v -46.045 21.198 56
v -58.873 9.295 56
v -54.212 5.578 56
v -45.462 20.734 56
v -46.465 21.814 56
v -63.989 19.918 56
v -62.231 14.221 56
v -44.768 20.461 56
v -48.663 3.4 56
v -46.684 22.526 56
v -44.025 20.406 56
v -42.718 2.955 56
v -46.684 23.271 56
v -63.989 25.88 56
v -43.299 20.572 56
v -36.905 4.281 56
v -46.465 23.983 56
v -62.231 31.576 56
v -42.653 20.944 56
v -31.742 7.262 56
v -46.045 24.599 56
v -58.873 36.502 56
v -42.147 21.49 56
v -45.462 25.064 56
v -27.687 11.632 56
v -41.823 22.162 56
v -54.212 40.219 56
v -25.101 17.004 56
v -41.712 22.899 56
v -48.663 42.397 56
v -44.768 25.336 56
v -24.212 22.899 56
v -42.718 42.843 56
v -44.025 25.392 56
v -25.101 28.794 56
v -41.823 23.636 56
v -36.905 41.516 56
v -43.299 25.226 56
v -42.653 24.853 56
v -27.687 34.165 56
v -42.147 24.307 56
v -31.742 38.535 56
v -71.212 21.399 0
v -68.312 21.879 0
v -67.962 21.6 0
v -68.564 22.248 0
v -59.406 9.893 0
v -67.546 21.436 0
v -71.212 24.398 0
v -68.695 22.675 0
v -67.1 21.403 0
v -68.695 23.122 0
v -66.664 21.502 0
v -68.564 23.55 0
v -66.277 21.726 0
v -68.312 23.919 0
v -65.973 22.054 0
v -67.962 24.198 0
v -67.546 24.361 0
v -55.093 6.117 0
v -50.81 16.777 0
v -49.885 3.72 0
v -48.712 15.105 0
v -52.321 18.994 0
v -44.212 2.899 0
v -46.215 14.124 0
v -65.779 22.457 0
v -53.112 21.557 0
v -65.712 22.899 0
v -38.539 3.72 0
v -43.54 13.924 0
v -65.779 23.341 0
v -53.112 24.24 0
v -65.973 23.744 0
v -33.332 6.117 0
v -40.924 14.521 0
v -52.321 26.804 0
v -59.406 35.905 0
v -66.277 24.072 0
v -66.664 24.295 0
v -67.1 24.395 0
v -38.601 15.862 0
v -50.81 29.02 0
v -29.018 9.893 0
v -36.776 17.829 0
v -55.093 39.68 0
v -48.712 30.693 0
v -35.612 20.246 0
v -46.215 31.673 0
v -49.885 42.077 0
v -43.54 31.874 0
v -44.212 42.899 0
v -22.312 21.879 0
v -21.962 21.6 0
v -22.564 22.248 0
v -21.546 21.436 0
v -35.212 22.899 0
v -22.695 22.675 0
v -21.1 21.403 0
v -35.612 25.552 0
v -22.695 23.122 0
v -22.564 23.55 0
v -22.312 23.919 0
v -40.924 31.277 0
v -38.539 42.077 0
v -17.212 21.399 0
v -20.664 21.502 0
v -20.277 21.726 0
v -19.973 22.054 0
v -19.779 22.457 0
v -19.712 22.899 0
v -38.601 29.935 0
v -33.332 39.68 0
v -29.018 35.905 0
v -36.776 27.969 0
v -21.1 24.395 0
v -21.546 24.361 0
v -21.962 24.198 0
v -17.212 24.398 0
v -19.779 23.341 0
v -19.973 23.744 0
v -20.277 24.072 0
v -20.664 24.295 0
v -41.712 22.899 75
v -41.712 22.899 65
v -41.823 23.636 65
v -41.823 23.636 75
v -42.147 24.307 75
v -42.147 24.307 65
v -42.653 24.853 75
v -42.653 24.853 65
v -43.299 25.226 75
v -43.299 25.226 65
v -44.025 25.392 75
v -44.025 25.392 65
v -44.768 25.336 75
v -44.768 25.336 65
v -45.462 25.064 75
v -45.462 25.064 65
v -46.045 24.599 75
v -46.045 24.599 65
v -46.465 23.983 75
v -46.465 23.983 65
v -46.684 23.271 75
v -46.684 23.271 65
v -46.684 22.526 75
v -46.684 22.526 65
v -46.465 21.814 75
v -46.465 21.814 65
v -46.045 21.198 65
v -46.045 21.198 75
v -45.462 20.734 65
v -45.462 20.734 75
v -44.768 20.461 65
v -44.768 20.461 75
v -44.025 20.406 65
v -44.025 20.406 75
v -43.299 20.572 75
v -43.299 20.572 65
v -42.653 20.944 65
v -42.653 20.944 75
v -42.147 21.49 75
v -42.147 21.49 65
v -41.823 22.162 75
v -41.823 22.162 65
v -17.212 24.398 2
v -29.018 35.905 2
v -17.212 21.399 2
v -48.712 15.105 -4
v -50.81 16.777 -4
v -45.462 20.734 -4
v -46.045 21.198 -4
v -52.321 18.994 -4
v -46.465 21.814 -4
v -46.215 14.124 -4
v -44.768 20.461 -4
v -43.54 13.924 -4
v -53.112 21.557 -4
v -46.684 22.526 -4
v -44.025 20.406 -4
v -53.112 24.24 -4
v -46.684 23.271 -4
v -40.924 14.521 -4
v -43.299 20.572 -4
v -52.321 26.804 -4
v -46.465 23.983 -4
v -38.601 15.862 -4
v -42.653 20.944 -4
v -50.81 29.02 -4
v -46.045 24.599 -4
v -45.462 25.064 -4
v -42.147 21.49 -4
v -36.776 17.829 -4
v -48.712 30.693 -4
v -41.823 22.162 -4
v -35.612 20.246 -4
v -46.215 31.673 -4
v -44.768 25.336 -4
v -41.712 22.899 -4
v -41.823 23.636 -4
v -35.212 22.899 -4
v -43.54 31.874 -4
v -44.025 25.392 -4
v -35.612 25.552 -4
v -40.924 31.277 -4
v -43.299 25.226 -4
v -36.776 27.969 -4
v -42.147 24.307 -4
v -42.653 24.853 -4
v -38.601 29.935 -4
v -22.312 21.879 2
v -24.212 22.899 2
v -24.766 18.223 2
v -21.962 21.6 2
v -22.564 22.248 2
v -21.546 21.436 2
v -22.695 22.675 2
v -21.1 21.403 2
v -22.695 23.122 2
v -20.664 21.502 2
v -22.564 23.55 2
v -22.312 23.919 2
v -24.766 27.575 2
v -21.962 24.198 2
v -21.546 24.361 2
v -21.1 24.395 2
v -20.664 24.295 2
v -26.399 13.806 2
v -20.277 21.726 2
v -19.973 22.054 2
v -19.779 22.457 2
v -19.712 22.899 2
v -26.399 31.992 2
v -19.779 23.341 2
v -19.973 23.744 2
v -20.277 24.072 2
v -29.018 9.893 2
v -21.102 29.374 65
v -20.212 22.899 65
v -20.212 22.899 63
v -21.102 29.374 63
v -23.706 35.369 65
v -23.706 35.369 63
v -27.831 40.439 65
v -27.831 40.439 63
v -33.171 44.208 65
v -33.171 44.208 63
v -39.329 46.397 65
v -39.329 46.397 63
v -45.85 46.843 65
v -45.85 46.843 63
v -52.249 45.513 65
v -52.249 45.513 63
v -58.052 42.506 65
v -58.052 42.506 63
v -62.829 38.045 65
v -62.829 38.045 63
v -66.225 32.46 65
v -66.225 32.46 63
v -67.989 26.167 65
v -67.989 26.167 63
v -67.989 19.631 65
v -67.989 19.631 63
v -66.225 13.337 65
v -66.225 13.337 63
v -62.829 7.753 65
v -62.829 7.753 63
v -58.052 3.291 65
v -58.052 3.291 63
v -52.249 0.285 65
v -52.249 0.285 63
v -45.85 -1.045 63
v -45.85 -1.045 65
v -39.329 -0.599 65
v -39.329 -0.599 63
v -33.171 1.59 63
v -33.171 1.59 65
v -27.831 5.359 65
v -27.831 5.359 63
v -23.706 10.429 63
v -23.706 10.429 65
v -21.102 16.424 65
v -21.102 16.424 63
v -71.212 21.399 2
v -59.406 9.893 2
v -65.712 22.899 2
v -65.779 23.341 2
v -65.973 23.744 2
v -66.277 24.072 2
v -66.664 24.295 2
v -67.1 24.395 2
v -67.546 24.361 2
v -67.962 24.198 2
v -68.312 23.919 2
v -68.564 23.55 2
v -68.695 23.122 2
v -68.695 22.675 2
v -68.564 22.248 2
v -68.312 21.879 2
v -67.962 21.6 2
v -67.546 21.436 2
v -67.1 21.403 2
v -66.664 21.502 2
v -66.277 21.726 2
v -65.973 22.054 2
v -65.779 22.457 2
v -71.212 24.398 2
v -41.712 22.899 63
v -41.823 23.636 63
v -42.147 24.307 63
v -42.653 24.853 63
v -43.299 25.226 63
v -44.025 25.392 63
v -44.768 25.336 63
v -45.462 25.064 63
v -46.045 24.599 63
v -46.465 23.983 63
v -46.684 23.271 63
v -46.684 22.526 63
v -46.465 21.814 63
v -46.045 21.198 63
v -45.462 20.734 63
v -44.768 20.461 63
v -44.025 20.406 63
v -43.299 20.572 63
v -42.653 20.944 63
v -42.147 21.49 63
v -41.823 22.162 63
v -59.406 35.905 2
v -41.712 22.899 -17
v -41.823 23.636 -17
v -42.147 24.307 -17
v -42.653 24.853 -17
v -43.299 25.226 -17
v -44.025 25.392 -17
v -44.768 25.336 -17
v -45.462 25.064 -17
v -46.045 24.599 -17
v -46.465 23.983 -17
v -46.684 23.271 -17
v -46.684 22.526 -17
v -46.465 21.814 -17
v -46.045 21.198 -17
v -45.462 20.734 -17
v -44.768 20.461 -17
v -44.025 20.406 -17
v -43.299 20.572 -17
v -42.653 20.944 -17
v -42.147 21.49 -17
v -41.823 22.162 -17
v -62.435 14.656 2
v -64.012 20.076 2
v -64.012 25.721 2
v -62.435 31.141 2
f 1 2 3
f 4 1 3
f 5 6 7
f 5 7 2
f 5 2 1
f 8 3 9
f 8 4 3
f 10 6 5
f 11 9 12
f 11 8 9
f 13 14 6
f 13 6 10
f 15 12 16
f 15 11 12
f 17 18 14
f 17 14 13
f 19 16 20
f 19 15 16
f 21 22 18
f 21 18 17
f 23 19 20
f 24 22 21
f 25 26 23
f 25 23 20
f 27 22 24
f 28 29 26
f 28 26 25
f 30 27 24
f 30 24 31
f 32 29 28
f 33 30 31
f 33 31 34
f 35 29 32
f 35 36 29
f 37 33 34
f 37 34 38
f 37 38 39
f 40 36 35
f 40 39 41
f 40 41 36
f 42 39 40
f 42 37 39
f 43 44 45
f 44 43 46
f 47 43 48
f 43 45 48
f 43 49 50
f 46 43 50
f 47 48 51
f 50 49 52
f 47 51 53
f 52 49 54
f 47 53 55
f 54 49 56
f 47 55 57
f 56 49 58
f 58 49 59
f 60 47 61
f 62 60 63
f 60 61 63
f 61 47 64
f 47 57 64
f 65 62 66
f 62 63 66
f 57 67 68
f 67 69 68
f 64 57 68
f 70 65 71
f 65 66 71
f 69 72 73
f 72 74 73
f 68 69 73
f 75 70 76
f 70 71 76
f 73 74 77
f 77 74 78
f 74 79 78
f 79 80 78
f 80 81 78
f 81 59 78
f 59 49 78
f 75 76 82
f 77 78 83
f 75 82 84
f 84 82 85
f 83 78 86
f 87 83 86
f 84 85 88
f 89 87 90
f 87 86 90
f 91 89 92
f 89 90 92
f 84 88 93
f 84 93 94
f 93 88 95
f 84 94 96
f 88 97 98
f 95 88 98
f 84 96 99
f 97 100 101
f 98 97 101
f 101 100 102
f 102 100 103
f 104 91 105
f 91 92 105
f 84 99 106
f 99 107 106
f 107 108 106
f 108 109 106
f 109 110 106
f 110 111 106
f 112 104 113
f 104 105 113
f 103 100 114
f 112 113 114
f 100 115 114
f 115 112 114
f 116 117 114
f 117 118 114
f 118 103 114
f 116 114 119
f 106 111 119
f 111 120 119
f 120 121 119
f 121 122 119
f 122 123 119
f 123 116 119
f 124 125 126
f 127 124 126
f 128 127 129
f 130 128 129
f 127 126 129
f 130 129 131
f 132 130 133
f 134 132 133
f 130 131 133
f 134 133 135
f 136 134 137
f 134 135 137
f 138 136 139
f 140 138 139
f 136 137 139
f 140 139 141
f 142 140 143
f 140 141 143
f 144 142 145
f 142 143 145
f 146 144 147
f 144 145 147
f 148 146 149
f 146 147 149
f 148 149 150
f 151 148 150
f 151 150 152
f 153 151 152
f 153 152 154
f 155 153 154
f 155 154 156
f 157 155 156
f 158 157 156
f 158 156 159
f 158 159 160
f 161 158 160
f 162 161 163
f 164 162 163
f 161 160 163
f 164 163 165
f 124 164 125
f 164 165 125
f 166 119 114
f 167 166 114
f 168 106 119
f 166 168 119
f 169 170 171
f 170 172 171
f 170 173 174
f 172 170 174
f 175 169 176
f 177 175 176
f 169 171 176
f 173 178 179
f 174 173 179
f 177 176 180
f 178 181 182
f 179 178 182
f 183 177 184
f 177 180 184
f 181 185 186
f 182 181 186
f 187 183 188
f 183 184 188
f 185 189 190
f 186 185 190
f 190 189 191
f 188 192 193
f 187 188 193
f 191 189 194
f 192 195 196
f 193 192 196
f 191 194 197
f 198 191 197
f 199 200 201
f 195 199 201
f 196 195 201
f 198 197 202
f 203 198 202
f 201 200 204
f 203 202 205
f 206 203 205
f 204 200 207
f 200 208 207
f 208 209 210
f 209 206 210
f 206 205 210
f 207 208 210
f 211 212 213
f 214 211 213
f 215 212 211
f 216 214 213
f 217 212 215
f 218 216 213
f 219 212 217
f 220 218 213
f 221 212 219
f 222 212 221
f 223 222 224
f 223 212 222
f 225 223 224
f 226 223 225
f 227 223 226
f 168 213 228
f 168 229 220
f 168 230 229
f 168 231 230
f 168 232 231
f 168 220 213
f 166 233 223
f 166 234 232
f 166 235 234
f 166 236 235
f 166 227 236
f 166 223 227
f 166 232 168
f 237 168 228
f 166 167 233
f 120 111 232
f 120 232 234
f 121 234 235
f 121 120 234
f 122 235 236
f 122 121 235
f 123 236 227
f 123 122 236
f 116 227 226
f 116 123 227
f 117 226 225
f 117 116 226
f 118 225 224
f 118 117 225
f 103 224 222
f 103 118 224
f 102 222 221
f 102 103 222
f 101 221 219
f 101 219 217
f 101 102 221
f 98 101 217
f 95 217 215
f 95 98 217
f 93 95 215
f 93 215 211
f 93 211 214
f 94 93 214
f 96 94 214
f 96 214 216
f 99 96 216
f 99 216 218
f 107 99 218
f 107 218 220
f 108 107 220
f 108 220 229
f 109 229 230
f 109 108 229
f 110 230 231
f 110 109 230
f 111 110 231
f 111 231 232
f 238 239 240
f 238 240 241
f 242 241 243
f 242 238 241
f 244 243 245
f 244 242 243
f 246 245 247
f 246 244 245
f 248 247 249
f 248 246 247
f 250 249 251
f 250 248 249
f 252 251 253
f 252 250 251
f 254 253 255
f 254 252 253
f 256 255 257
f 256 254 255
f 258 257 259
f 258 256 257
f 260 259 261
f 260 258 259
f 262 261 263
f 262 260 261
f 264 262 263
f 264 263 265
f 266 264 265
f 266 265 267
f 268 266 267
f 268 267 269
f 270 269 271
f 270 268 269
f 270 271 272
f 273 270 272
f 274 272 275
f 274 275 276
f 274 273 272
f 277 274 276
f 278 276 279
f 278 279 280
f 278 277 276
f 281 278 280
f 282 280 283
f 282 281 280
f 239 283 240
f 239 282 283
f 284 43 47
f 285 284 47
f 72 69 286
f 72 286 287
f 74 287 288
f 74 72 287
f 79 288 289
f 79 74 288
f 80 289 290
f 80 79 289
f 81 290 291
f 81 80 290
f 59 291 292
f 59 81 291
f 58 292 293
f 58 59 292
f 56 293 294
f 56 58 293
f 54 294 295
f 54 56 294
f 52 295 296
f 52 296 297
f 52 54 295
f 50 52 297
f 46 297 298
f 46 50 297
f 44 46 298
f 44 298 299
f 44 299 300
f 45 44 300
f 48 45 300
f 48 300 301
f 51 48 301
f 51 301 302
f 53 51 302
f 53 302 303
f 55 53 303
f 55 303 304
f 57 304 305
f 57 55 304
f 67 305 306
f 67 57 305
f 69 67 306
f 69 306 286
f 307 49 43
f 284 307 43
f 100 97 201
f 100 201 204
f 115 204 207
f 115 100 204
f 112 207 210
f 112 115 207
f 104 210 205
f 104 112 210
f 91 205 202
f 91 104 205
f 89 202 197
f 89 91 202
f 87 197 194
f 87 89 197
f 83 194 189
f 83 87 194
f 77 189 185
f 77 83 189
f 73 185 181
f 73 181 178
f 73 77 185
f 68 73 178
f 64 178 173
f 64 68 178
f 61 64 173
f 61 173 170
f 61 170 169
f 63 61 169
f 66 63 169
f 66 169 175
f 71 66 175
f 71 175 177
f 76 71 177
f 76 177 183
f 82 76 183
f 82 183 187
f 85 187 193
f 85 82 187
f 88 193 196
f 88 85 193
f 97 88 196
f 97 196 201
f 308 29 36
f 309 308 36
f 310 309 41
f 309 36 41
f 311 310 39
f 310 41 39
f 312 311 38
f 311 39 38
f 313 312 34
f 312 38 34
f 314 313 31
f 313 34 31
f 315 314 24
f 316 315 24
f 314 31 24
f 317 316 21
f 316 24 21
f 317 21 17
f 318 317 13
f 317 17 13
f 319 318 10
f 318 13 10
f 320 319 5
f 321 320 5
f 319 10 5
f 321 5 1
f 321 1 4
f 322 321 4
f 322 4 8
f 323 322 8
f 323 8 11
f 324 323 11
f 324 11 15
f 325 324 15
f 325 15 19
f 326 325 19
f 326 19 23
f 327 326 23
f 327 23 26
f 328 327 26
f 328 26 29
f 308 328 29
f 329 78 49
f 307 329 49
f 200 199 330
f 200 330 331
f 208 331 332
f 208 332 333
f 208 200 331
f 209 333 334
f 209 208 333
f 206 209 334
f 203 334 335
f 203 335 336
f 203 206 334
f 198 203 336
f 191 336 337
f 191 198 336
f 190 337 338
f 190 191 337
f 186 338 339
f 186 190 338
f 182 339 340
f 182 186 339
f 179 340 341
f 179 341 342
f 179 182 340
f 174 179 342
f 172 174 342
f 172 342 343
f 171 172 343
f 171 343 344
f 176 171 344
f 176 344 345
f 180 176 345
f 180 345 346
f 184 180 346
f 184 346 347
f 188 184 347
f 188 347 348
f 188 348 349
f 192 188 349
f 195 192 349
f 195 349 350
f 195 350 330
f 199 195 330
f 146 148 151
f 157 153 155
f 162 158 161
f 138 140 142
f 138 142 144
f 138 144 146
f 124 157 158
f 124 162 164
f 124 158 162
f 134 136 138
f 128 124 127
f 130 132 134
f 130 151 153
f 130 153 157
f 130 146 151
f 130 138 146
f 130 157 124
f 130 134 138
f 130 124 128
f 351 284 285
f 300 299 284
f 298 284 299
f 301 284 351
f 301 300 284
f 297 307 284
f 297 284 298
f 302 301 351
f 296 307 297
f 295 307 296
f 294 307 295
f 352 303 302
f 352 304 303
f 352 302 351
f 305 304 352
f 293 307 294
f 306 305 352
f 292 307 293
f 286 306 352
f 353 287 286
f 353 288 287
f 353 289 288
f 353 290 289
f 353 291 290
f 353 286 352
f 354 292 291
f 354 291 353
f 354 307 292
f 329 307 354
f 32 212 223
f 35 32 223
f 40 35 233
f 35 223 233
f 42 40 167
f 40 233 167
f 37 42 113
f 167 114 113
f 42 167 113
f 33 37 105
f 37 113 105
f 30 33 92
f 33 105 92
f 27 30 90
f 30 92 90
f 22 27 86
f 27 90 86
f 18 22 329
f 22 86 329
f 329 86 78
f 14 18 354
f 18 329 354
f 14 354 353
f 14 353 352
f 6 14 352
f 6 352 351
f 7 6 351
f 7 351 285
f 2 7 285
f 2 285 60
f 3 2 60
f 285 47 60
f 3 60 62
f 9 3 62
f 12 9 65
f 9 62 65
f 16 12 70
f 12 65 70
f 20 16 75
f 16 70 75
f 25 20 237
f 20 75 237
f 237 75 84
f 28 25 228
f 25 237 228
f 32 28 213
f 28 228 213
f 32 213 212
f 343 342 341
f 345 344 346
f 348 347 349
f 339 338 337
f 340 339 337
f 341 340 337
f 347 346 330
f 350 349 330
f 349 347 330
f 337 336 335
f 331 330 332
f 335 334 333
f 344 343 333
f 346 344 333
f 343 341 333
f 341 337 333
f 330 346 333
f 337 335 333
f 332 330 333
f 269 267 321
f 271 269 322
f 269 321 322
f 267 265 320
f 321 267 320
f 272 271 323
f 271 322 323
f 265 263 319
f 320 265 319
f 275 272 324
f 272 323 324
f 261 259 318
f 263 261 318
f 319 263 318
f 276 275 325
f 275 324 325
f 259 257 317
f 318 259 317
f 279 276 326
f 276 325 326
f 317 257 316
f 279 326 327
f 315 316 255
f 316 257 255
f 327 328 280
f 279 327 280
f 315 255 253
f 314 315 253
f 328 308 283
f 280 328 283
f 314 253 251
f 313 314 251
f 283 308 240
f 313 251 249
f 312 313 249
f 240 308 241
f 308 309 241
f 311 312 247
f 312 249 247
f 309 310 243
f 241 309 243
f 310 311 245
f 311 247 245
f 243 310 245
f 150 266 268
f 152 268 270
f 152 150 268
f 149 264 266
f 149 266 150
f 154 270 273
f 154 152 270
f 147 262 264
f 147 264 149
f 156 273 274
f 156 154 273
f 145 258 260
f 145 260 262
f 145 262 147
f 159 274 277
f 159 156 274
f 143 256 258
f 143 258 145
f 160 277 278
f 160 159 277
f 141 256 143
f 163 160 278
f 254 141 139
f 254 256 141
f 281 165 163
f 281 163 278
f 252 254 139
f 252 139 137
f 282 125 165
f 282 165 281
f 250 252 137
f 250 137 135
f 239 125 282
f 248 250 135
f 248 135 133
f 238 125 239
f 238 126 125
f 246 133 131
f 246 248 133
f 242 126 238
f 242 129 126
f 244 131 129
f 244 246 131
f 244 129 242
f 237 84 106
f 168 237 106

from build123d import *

# Parameters (mm, degrees)
SKETCH1_R                = 20
BOSS_EXTRUDE2_DEPTH      = 56
SKETCH1_4_R              = 1.5
BOSS_EXTRUDE3_DEPTH      = 2
SKETCH1_5_R              = 9
SKETCH1_5_R_2            = 2.5
BOSS_EXTRUDE4_DEPTH      = 4
BOSS_EXTRUDE6_DEPTH      = 65
BOSS_EXTRUDE6_DEPTH_BACK = 17
SKETCH1_7_R              = 2.5
SKETCH8_R                = 24
SKETCH8_R_2              = 2.5
BOSS_EXTRUDE9_DEPTH      = 2
SKETCH9_R                = 2.5
BOSS_EXTRUDE11_DEPTH     = 10


with BuildPart() as part:
    # Sketch1 → Boss-Extrude2 (new body)
    with BuildSketch(Plane.XY):
        with Locations((-44.212108768, 22.898771409)):
            Circle(SKETCH1_R)
    extrude(amount=BOSS_EXTRUDE2_DEPTH)

    # Sketch1<4> → Boss-Extrude3 (add)
    # profile 1 of 2: a face of its own
    with BuildSketch(Plane.XY):
        with BuildLine():
            Line((-71.211826981, 24.398484848), (-71.211826981, 21.399057969))
            Line((-71.211826981, 21.399057969), (-59.405868846, 9.893016732))
            ThreePointArc((-59.405868846, 9.893016732), (-64.212108768, 22.898771409), (-59.405868846, 35.904526085))
            Line((-59.405868846, 35.904526085), (-71.211826981, 24.398484848))
        make_face()
        with Locations((-67.212108768, 22.898771409)):
            Circle(SKETCH1_4_R, mode=Mode.SUBTRACT)
    # profile 2 of 2: a face of its own
    with BuildSketch(Plane.XY):
        with BuildLine():
            ThreePointArc((-29.018348691, 35.904526085), (-24.212108768, 22.898771409), (-29.018348691, 9.893016732))
            Line((-29.018348691, 9.893016732), (-17.212390555, 21.399057969))
            Line((-17.212390555, 21.399057969), (-17.212390555, 24.398484848))
            Line((-17.212390555, 24.398484848), (-29.018348691, 35.904526085))
        make_face()
        with Locations((-21.212108768, 22.898771409)):
            Circle(SKETCH1_4_R, mode=Mode.SUBTRACT)
    extrude(amount=BOSS_EXTRUDE3_DEPTH)

    # Sketch1<5> → Boss-Extrude4 (add)
    with BuildSketch(Plane.XY):
        with Locations((-44.212108768, 22.898771409)):
            Circle(SKETCH1_5_R)
        with Locations((-44.212108768, 22.898771409)):
            Circle(SKETCH1_5_R_2, mode=Mode.SUBTRACT)
    extrude(amount=-BOSS_EXTRUDE4_DEPTH)

    # Sketch1<7> → Boss-Extrude6 (add, two sides: drawn at the far end of the back side and taken through both)
    with BuildSketch(Plane.XY.offset(-BOSS_EXTRUDE6_DEPTH_BACK)):
        with Locations((-44.212108768, 22.898771409)):
            Circle(SKETCH1_7_R)
    extrude(amount=BOSS_EXTRUDE6_DEPTH + BOSS_EXTRUDE6_DEPTH_BACK)

    # Sketch8 → Boss-Extrude9 (add)
    with BuildSketch(Plane.XY.offset(65)):
        with Locations((-44.212108768, 22.898771409)):
            Circle(SKETCH8_R)
        with Locations((-44.212108768, 22.898771409)):
            Circle(SKETCH8_R_2, mode=Mode.SUBTRACT)
    extrude(amount=-BOSS_EXTRUDE9_DEPTH)

    # Sketch9 → Boss-Extrude11 (add)
    with BuildSketch(Plane.XY.offset(65)):
        with Locations((-44.212108768, 22.898771409)):
            Circle(SKETCH9_R)
    extrude(amount=BOSS_EXTRUDE11_DEPTH)


solid = part.part
